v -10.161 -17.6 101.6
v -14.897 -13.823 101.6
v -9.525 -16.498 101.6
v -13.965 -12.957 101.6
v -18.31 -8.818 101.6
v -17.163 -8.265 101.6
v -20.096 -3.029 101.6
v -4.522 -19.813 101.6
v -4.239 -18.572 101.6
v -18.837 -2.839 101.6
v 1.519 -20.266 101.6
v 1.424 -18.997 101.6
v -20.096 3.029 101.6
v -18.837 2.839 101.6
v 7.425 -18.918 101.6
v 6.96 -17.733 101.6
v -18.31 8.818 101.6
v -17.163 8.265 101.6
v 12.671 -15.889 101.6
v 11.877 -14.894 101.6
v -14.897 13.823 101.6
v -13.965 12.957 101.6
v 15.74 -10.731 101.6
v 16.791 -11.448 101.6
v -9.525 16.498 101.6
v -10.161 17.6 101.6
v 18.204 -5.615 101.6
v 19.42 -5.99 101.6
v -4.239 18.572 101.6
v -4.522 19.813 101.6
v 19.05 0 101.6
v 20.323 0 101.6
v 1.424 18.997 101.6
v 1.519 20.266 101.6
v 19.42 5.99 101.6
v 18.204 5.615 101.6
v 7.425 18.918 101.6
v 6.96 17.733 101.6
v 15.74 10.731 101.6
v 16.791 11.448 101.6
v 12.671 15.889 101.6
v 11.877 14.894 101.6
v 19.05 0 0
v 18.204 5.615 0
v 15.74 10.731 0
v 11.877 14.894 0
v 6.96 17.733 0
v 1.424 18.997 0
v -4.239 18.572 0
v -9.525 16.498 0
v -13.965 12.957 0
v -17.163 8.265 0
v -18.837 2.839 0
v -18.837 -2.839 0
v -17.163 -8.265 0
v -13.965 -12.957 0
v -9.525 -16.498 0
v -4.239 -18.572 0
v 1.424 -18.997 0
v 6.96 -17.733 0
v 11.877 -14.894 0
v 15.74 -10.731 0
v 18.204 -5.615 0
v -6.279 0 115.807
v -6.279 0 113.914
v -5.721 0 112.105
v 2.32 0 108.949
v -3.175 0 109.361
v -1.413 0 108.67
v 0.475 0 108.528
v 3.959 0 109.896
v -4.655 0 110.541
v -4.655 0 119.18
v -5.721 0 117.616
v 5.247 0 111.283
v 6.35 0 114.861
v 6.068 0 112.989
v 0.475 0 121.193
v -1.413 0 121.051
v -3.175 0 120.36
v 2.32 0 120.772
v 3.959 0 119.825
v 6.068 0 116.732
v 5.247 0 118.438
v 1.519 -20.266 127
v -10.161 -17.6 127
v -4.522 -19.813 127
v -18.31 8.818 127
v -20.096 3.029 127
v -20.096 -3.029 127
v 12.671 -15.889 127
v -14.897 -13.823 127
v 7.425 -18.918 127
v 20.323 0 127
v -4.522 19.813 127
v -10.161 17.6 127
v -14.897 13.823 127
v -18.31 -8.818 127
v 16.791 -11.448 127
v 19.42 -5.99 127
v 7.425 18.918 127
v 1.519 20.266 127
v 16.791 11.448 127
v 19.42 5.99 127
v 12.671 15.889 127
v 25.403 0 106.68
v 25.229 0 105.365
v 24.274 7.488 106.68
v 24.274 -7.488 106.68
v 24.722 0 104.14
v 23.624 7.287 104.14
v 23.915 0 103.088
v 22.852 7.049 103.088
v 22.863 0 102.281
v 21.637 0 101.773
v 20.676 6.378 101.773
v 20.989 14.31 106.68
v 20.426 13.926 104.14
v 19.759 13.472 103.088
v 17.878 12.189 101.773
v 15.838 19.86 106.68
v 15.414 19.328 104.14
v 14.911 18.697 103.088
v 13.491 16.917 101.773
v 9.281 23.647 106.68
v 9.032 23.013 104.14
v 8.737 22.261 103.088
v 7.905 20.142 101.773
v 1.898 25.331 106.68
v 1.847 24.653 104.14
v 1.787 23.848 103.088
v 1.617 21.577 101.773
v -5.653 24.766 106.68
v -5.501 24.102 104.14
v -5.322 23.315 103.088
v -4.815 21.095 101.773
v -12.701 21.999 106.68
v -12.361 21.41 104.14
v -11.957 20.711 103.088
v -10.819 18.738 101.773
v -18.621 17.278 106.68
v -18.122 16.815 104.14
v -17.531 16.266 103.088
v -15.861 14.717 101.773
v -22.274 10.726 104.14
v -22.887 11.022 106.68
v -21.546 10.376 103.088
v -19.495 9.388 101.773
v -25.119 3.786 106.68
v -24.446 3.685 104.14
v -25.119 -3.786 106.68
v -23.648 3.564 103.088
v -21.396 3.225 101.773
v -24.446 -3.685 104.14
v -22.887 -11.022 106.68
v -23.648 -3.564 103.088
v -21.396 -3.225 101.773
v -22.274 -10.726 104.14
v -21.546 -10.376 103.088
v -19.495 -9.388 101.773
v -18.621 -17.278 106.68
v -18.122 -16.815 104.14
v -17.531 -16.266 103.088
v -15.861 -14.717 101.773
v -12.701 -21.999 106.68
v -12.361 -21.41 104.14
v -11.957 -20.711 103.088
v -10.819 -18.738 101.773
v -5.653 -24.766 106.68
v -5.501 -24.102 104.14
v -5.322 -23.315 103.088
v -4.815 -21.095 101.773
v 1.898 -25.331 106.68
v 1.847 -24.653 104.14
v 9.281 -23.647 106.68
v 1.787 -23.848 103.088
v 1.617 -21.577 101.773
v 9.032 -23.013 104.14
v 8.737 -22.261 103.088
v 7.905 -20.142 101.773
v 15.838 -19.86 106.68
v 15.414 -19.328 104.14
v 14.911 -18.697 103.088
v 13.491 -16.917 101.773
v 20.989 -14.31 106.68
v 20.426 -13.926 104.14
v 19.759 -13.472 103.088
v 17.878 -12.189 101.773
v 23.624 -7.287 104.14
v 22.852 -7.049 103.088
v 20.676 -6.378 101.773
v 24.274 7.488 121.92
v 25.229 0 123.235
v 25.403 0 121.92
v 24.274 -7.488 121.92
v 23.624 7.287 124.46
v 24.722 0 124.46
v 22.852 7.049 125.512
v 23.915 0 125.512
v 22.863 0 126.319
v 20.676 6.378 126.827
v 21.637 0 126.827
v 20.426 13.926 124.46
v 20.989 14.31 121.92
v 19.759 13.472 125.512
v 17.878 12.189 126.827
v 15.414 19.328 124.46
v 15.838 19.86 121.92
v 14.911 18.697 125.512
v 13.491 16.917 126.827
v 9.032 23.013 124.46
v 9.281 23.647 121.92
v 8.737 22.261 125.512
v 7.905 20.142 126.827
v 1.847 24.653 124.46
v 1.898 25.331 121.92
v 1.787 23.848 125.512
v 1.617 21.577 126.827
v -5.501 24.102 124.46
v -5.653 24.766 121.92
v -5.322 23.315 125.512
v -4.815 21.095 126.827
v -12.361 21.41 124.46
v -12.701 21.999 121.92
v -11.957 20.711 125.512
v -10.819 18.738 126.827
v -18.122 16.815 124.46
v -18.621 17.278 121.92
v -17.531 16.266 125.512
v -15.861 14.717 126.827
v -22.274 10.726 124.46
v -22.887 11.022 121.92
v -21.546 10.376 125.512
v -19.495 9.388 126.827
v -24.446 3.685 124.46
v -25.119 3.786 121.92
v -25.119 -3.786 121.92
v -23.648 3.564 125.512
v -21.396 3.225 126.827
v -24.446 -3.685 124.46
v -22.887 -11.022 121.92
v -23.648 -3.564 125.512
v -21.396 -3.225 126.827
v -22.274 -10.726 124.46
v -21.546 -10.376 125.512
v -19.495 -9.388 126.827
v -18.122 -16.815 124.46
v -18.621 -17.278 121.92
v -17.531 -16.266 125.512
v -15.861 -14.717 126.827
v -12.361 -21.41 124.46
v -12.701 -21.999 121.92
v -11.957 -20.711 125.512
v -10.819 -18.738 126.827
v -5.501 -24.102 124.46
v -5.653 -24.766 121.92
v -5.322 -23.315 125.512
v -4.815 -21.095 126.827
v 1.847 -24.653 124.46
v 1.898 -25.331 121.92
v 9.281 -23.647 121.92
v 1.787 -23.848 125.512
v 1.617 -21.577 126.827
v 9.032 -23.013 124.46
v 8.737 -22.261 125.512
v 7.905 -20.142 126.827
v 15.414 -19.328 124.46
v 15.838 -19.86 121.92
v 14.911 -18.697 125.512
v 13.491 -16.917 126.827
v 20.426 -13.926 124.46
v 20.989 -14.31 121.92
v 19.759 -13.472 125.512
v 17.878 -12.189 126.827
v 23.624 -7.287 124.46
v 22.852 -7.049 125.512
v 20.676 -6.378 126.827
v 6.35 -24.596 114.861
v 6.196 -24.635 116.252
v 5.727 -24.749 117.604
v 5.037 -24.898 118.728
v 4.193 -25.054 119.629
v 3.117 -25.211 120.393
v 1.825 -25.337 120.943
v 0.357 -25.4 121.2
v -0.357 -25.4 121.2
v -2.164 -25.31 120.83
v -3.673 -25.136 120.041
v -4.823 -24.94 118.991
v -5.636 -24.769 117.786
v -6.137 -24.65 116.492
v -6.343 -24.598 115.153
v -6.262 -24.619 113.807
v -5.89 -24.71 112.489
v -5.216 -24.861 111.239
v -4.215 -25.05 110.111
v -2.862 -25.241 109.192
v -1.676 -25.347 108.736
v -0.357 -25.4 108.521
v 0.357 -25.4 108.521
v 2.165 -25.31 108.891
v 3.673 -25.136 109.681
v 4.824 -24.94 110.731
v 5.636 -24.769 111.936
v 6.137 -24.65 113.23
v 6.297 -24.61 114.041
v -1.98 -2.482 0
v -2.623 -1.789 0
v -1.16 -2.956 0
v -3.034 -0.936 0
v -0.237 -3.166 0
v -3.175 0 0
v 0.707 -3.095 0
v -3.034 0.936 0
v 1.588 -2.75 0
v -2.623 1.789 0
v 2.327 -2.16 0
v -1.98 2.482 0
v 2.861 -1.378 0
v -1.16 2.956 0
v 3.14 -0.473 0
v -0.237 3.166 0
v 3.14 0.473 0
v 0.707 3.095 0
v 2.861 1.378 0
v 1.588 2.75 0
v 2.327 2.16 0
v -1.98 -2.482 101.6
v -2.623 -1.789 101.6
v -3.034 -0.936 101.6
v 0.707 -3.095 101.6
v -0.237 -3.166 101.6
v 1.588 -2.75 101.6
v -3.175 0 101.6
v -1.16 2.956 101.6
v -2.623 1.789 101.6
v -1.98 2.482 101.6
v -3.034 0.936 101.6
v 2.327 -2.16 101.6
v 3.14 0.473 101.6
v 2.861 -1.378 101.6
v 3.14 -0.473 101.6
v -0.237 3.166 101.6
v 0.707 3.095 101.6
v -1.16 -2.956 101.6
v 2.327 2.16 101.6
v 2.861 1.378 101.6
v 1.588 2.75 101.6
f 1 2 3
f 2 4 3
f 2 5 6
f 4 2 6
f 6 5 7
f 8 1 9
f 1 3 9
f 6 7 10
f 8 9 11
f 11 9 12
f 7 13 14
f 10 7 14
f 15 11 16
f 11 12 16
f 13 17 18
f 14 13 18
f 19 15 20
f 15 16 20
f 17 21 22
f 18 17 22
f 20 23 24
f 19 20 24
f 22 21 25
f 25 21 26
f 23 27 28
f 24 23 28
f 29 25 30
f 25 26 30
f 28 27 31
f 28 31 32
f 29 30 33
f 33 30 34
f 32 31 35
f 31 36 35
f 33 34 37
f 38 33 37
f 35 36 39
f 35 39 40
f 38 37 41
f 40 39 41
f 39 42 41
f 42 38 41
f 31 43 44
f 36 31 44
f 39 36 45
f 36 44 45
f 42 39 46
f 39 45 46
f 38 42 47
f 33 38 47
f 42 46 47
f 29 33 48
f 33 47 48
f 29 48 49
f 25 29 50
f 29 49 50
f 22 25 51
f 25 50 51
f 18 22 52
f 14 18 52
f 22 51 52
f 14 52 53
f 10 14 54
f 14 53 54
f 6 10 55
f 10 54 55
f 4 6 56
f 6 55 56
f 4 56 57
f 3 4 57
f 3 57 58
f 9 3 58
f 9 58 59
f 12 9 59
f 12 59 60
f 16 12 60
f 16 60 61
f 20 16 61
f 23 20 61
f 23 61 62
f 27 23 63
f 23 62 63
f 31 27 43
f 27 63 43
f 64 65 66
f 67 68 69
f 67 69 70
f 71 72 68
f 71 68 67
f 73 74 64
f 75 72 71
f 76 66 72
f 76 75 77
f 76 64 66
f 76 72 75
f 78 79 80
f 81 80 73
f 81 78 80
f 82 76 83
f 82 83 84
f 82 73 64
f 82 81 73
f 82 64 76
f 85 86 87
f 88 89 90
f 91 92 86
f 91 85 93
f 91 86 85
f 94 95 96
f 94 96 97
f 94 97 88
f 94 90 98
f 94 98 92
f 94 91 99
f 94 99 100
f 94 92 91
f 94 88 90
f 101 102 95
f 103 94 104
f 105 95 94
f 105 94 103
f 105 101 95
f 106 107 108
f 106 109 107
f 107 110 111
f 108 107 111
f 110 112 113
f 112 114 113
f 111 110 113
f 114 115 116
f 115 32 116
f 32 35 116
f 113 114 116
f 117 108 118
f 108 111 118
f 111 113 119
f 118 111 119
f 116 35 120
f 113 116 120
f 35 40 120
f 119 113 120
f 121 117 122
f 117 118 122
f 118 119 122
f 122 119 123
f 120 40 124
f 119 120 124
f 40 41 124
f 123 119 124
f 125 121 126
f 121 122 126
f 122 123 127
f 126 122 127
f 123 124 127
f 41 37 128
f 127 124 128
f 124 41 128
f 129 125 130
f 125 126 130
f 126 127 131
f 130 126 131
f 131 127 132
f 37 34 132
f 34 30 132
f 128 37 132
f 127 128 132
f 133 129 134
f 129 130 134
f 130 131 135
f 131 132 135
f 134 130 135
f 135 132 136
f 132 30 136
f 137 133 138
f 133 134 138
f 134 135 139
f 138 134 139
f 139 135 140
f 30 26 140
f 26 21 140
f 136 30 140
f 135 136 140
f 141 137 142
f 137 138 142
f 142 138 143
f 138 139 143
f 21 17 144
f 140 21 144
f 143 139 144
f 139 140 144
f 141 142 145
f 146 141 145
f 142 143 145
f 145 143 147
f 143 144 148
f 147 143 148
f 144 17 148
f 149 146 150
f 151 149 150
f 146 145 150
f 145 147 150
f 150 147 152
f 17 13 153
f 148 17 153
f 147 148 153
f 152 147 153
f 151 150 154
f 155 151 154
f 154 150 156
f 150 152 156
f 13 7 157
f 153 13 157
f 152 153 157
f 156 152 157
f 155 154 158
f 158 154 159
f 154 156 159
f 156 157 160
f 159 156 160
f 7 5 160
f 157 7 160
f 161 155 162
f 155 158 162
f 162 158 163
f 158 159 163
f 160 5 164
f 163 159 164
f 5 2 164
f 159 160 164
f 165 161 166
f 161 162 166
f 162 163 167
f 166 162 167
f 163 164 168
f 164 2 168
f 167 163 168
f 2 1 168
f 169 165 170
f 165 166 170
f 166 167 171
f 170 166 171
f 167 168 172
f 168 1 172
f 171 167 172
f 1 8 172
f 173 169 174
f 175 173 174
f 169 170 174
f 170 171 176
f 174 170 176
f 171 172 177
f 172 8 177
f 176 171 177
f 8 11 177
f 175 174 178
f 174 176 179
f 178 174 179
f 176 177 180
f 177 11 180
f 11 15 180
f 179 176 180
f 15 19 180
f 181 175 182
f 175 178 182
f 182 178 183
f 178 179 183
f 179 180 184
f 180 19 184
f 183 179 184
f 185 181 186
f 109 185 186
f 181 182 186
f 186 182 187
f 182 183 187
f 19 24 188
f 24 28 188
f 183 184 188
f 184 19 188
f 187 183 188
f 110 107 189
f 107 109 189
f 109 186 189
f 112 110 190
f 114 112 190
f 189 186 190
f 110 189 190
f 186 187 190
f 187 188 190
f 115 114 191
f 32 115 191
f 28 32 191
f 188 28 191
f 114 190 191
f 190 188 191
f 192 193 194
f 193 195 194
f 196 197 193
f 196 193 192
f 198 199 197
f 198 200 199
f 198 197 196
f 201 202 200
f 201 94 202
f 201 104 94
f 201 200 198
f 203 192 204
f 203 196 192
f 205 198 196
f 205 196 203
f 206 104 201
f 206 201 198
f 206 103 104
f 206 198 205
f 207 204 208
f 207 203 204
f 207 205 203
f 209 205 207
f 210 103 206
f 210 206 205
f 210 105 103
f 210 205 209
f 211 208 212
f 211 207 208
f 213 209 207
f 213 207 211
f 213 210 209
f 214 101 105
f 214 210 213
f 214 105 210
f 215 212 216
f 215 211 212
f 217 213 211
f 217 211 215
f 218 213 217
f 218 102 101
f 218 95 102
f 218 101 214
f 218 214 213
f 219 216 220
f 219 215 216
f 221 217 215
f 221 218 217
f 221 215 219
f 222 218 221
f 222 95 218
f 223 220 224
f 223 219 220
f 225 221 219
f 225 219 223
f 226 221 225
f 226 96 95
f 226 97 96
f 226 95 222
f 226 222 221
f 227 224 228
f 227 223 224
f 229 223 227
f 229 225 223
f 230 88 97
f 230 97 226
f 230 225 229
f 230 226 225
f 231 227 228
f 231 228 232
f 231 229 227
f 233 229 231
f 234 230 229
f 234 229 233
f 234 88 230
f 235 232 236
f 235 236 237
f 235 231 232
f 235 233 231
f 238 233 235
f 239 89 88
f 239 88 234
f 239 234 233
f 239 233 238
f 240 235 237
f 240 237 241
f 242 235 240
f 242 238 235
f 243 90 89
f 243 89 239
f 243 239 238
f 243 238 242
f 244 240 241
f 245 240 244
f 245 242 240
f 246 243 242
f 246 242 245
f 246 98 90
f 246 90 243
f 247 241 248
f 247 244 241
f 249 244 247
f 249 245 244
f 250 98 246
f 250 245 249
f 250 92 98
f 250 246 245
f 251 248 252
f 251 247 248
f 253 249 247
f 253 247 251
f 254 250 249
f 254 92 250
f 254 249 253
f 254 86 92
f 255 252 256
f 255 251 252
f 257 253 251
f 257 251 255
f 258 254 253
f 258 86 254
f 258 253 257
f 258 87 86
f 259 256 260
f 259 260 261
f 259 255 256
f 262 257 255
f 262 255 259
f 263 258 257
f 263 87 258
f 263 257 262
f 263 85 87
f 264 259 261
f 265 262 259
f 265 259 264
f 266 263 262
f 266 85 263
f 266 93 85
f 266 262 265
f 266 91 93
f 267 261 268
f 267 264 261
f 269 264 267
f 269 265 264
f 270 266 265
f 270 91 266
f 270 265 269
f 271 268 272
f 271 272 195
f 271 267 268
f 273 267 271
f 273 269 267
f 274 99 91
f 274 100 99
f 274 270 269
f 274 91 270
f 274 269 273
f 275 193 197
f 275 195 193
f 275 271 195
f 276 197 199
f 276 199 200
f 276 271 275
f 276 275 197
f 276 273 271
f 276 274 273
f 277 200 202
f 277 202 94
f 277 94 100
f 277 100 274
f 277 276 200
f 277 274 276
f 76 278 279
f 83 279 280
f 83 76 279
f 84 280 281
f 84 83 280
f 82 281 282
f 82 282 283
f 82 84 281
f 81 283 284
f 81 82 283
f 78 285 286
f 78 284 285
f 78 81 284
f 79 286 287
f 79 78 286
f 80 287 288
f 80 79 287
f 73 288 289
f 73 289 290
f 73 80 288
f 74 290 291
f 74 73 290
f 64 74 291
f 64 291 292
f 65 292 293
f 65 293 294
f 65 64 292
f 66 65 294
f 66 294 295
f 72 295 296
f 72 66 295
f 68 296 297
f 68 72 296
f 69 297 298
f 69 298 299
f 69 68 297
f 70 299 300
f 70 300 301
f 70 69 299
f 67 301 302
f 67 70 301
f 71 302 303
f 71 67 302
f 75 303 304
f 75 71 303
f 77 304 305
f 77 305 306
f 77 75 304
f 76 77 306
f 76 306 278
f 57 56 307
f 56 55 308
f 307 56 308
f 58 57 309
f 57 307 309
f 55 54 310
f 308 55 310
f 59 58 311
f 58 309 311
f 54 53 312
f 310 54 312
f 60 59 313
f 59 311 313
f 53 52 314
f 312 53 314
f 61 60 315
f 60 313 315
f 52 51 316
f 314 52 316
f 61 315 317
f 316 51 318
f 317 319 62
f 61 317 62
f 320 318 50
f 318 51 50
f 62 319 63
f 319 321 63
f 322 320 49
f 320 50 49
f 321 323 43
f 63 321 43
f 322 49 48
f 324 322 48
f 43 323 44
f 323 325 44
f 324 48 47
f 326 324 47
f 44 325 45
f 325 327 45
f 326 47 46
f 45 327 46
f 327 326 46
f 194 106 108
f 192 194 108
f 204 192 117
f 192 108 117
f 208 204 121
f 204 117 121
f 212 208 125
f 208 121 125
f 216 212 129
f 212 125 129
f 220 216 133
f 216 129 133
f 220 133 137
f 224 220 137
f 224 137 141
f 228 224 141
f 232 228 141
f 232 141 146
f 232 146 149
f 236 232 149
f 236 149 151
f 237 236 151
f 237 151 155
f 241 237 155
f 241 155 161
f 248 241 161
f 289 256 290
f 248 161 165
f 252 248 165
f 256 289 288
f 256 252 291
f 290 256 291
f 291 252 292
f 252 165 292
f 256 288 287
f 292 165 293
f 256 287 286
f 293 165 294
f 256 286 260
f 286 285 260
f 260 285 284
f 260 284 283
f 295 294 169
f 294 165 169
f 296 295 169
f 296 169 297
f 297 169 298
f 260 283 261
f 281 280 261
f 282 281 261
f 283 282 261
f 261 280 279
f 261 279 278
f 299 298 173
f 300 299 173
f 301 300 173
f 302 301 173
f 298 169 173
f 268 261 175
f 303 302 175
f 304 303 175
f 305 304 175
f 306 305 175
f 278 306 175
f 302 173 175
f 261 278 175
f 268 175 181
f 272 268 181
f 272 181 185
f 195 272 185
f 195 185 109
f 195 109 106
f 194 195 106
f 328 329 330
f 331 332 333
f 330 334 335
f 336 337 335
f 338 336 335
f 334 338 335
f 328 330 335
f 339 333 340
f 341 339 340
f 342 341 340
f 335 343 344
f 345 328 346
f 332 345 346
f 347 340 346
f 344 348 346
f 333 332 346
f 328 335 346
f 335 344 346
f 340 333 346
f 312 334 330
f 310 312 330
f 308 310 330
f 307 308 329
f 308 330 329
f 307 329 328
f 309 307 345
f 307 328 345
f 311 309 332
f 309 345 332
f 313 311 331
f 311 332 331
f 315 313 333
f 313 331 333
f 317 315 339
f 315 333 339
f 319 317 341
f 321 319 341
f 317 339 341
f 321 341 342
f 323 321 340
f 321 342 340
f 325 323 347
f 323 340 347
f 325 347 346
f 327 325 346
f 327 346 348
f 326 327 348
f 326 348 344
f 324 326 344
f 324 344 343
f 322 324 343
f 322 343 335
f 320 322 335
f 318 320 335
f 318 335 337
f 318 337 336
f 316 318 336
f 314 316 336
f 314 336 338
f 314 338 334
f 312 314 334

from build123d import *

# Parameters (mm, degrees)
F0_R     = 19.05
F1_DEPTH = 101.6
F3_D     = 6.35
F4_R     = 25.402508
F5_DEPTH = 25.4
F6_R     = 6.35
F7_DEPTH = 25.4
F8_R     = 6.35
F9_DEPTH = 127
F10_R    = 5.08


with BuildPart() as f1:
    # F0 (on Top) → F1 (new body)
    with BuildSketch(Plane.XY):
        Circle(F0_R)
    extrude(amount=F1_DEPTH)

    # F3 (through all)
    with Locations(Plane(origin=(0, 0, 0), x_dir=(1, 0, 0), z_dir=(0, 0, -1))):
        with Locations((0, 0)):
            Hole(F3_D / 2)

    # F4 (on face) → F5 (join)
    with BuildSketch(Plane.XY.offset(101.6)):
        Circle(F4_R)
    extrude(amount=F5_DEPTH)

    # F6 (on Front) → F7 (cut)
    with BuildSketch(Plane.XZ):
        with Locations((0, 114.860535)):
            Circle(F6_R)
    extrude(amount=F7_DEPTH, mode=Mode.SUBTRACT)

    # F8 (on face) → F9 (cut)
    with BuildSketch(Plane.XZ):
        with Locations((0, 114.860535)):
            Circle(F8_R)
    extrude(amount=F9_DEPTH, mode=Mode.SUBTRACT)

    # F10
    f10_edges = [f1.edges().sort_by_distance(p)[0] for p in [
        (-25.402508, 0, 101.6),
        (-25.402508, 0, 127),
    ]]
    fillet(f10_edges, radius=F10_R)


solid = f1.part
